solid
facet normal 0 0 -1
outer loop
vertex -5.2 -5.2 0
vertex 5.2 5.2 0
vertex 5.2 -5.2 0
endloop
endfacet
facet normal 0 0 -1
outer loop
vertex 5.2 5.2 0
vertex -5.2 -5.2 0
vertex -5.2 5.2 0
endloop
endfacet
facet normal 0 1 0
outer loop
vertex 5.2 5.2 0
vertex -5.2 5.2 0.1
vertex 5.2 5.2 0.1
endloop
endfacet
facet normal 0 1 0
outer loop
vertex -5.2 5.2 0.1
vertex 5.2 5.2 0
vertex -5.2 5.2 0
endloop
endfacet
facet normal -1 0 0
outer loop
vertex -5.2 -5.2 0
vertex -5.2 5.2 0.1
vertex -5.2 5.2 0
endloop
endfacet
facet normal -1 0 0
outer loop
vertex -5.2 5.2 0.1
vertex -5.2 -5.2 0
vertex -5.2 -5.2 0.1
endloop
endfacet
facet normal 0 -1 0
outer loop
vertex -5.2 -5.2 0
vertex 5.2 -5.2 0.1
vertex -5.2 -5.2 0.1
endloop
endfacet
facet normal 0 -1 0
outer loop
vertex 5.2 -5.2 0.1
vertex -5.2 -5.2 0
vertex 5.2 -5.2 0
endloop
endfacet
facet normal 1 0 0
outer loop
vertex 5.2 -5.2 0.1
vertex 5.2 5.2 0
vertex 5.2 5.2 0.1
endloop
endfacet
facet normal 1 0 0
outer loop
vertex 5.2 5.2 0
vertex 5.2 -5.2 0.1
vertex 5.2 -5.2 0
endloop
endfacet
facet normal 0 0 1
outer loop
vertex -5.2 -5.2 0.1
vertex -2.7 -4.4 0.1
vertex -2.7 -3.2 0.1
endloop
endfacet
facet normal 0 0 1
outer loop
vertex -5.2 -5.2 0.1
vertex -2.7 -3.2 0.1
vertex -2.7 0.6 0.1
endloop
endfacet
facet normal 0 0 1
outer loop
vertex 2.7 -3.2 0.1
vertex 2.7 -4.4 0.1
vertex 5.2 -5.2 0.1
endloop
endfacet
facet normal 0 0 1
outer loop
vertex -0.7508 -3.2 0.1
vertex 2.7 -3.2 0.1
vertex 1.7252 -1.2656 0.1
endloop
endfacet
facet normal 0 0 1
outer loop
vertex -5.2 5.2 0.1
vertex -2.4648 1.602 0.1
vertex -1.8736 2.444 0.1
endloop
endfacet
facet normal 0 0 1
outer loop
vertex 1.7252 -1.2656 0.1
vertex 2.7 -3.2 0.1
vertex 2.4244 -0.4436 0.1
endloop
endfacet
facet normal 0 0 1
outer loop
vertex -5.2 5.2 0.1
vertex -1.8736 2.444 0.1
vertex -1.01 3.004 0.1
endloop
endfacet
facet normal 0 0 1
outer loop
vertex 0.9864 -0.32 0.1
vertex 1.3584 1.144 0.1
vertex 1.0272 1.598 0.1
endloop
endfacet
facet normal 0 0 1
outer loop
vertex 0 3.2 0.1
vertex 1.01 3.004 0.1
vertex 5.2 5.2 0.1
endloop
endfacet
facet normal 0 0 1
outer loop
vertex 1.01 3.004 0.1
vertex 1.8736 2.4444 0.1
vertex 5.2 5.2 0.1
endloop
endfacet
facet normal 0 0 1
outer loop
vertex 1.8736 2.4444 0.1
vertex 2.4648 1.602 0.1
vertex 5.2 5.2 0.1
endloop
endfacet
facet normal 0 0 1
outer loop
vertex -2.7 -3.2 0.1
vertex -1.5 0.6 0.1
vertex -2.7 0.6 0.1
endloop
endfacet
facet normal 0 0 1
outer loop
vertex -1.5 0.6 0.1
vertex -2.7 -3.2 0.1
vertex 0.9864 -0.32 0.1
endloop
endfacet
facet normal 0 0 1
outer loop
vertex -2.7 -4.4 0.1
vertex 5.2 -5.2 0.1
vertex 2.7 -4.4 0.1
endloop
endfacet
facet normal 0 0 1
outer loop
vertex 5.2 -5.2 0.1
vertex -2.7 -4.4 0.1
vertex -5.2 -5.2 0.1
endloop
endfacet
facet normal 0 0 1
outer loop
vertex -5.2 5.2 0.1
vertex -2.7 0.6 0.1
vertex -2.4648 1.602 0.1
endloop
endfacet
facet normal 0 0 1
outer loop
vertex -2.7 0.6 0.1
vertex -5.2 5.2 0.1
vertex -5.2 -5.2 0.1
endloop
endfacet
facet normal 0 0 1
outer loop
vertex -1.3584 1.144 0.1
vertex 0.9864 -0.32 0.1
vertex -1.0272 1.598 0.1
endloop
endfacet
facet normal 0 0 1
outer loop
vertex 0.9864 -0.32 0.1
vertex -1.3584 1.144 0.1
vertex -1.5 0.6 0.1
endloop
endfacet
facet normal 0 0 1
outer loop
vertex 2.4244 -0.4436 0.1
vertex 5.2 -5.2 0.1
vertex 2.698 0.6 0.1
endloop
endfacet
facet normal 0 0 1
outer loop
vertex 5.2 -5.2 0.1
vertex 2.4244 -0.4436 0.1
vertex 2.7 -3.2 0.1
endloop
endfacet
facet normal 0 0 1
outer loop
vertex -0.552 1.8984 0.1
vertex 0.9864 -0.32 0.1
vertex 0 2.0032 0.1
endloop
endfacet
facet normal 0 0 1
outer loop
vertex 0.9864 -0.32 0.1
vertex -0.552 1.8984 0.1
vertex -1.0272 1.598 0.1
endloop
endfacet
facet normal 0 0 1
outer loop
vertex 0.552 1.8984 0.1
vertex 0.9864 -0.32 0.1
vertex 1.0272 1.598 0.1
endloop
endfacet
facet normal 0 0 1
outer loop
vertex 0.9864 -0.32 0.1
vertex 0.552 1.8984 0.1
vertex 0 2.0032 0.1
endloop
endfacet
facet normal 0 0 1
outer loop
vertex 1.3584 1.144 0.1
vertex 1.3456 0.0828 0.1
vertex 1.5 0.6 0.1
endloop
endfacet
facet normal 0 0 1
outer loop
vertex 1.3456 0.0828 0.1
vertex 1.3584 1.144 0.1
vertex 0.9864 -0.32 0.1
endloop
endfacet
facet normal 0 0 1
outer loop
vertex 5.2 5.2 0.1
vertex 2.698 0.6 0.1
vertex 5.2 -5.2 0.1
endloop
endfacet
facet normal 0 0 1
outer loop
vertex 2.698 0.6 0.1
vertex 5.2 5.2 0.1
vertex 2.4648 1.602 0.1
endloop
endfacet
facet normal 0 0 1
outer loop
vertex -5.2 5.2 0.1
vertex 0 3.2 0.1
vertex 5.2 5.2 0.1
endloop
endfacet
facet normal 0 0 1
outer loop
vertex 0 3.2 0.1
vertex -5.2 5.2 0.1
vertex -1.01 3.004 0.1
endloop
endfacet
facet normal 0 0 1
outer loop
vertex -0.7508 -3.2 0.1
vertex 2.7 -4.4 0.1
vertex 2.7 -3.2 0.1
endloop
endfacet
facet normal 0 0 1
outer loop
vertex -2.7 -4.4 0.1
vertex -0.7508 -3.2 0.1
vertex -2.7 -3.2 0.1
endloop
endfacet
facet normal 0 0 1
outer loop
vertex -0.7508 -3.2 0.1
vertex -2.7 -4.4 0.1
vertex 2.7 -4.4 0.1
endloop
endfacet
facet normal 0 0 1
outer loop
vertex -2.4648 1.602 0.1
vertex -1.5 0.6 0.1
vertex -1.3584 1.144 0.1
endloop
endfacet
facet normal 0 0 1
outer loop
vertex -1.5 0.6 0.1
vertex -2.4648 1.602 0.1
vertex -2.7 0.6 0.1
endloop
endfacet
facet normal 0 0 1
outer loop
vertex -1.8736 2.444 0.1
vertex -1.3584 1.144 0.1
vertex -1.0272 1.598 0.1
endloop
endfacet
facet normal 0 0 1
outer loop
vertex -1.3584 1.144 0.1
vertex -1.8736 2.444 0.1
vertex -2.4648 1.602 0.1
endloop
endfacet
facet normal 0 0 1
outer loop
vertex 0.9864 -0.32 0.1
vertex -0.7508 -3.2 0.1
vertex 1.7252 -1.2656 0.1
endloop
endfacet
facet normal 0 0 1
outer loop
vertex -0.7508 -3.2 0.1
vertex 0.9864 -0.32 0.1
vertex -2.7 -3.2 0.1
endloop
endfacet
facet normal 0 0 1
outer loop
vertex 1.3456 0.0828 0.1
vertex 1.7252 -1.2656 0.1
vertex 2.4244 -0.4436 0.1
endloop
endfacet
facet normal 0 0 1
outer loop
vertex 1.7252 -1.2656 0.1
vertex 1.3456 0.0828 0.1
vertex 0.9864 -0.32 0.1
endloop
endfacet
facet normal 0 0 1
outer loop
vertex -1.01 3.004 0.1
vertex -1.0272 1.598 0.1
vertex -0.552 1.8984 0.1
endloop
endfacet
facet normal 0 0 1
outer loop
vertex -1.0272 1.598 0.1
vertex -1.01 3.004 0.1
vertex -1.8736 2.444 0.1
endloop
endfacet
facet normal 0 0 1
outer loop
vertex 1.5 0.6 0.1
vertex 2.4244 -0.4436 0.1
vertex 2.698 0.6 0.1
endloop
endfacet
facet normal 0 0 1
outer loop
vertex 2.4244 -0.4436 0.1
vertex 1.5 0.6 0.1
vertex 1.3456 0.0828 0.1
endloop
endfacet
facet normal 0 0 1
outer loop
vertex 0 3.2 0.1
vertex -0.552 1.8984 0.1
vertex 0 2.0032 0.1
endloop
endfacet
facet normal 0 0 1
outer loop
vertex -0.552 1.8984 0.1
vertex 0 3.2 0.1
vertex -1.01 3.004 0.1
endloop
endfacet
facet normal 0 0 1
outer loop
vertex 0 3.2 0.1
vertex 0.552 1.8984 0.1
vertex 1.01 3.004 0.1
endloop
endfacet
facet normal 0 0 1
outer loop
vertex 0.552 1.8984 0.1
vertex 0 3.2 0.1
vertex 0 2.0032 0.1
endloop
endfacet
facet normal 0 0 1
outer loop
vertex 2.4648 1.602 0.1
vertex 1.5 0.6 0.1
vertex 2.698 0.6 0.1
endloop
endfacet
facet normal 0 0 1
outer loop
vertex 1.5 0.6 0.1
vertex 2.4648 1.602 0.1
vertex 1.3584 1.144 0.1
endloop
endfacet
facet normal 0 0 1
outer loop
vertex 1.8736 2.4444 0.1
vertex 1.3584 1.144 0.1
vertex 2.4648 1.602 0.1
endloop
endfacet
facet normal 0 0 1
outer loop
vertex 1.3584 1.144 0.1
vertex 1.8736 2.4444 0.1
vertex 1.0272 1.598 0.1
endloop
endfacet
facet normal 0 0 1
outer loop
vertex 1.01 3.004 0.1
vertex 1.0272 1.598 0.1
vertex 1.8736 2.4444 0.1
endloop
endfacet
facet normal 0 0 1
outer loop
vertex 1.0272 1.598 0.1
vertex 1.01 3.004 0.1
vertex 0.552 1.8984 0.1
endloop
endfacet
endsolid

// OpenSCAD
// file: ../p/box5-12.scad
use <../lib.scad>
function ldraw_lib__box5_12() = [
// 0 Box with 5 Faces without Any Edges
// 0 Name: box5-12.dat
// 0 Author: Chris Dee [cwdee]
// 0 !LDRAW_ORG Primitive UPDATE 2009-02
// 0 !LICENSE Licensed under CC BY 4.0 : see CAreadme.txt
// 
// 0 BFC CERTIFY CCW
  [0,"BFC","CERTIFY"],
  [0,"BFC","CCW"],
// 
// 0 !HISTORY 2009-09-03 [PTadmin] Official Update 2009-02
// 
// 
// 4 16 1 1 1 1 1 -1 -1 1 -1 -1 1 1
  [4,16,1,1,1,1,1,-1,-1,1,-1,-1,1,1],
// 4 16 -1 0 1 1 0 1 1 1 1 -1 1 1
  [4,16,-1,0,1,1,0,1,1,1,1,-1,1,1],
// 4 16 -1 0 -1 -1 0 1 -1 1 1 -1 1 -1
  [4,16,-1,0,-1,-1,0,1,-1,1,1,-1,1,-1],
// 4 16 1 0 -1 -1 0 -1 -1 1 -1 1 1 -1
  [4,16,1,0,-1,-1,0,-1,-1,1,-1,1,1,-1],
// 4 16 1 0 1 1 0 -1 1 1 -1 1 1 1
  [4,16,1,0,1,1,0,-1,1,1,-1,1,1,1],
// 0
];
module ldraw_lib__box5_12(step=0, col=false, unit=2/5, alt=false, line=0.2, solid=!$preview)
    makepoly(ldraw_lib__box5_12(), step=step, col=col, unit=unit, alt=alt, line=line, solid=solid);
ldraw_lib__box5_12(line=0.2);
// main file
use <../lib.scad>
use <../p/box5-12.scad>
function ldraw_lib__169665f() = [
// 0 Sticker  1.3 x  1.3 with Black Number "2"
// 0 Name: 169665f.dat
// 0 Author: Chris Böhnke [KnightOfTarenta]
// 0 !LDRAW_ORG Part UPDATE 2026-06
// 0 !LICENSE Licensed under CC BY 4.0 : see CAreadme.txt
// 
// 0 BFC CERTIFY CCW
  [0,"BFC","CERTIFY"],
  [0,"BFC","CCW"],
// 
// 0 !KEYWORDS Booster Rocket, Bricklink 6339stk01, Brickowl 588738, Launch Command
// 0 !KEYWORDS Rebrickable 169665, set 6339, Shuttle Launch Pad, space port, town
// 
// 0 !HISTORY 2026-06-28 [OrionP] Official Update 2026-06
// 
// 1 16 0 -0.25 0 13 0 0 0 .25 0 0 0 13 box5-12.dat
  [1,16,0,-0.25,0,13,0,0,0,.25,0,0,0,13, ldraw_lib__box5_12()],
// 
// 0 // Colour 16 Main Colour
// 3 16 -13 -.25 -13 -6.75 -.25 -11 -6.75 -.25 -8
  [3,16,-13,-.25,-13,-6.75,-.25,-11,-6.75,-.25,-8],
// 3 16 -13 -.25 -13 -6.75 -.25 -8 -6.75 -.25 1.5
  [3,16,-13,-.25,-13,-6.75,-.25,-8,-6.75,-.25,1.5],
// 3 16 6.75 -.25 -8 6.75 -.25 -11 13 -.25 -13
  [3,16,6.75,-.25,-8,6.75,-.25,-11,13,-.25,-13],
// 3 16 -1.877 -.25 -8 6.75 -.25 -8 4.313 -.25 -3.164
  [3,16,-1.877,-.25,-8,6.75,-.25,-8,4.313,-.25,-3.164],
// 3 16 -13 -.25 13 -6.162 -.25 4.005 -4.684 -.25 6.11
  [3,16,-13,-.25,13,-6.162,-.25,4.005,-4.684,-.25,6.11],
// 3 16 4.313 -.25 -3.164 6.75 -.25 -8 6.061 -.25 -1.109
  [3,16,4.313,-.25,-3.164,6.75,-.25,-8,6.061,-.25,-1.109],
// 3 16 -13 -.25 13 -4.684 -.25 6.11 -2.525 -.25 7.51
  [3,16,-13,-.25,13,-4.684,-.25,6.11,-2.525,-.25,7.51],
// 3 16 2.466 -.25 -.8 3.396 -.25 2.86 2.568 -.25 3.995
  [3,16,2.466,-.25,-.8,3.396,-.25,2.86,2.568,-.25,3.995],
// 3 16 0 -.25 8 2.525 -.25 7.51 13 -.25 13
  [3,16,0,-.25,8,2.525,-.25,7.51,13,-.25,13],
// 3 16 2.525 -.25 7.51 4.684 -.25 6.111 13 -.25 13
  [3,16,2.525,-.25,7.51,4.684,-.25,6.111,13,-.25,13],
// 3 16 4.684 -.25 6.111 6.162 -.25 4.005 13 -.25 13
  [3,16,4.684,-.25,6.111,6.162,-.25,4.005,13,-.25,13],
// 4 16 2.466 -.25 -.8 -3.75 -.25 1.5 -6.75 -.25 1.5 -6.75 -.25 -8
  [4,16,2.466,-.25,-.8,-3.75,-.25,1.5,-6.75,-.25,1.5,-6.75,-.25,-8],
// 4 16 -13 -.25 -13 13 -.25 -13 6.75 -.25 -11 -6.75 -.25 -11
  [4,16,-13,-.25,-13,13,-.25,-13,6.75,-.25,-11,-6.75,-.25,-11],
// 4 16 -6.162 -.25 4.005 -13 -.25 13 -13 -.25 -13 -6.75 -.25 1.5
  [4,16,-6.162,-.25,4.005,-13,-.25,13,-13,-.25,-13,-6.75,-.25,1.5],
// 4 16 -2.568 -.25 3.995 -3.396 -.25 2.86 -3.75 -.25 1.5 2.466 -.25 -.8
  [4,16,-2.568,-.25,3.995,-3.396,-.25,2.86,-3.75,-.25,1.5,2.466,-.25,-.8],
// 4 16 6.745 -.25 1.5 6.061 -.25 -1.109 6.75 -.25 -8 13 -.25 -13
  [4,16,6.745,-.25,1.5,6.061,-.25,-1.109,6.75,-.25,-8,13,-.25,-13],
// 4 16 -2.568 -.25 3.995 2.466 -.25 -.8 0 -.25 5.008 -1.38 -.25 4.746
  [4,16,-2.568,-.25,3.995,2.466,-.25,-.8,0,-.25,5.008,-1.38,-.25,4.746],
// 4 16 2.568 -.25 3.995 1.38 -.25 4.746 0 -.25 5.008 2.466 -.25 -.8
  [4,16,2.568,-.25,3.995,1.38,-.25,4.746,0,-.25,5.008,2.466,-.25,-.8],
// 4 16 3.75 -.25 1.5 3.396 -.25 2.86 2.466 -.25 -.8 3.364 -.25 .207
  [4,16,3.75,-.25,1.5,3.396,-.25,2.86,2.466,-.25,-.8,3.364,-.25,.207],
// 4 16 6.162 -.25 4.005 6.745 -.25 1.5 13 -.25 -13 13 -.25 13
  [4,16,6.162,-.25,4.005,6.745,-.25,1.5,13,-.25,-13,13,-.25,13],
// 4 16 -2.525 -.25 7.51 0 -.25 8 13 -.25 13 -13 -.25 13
  [4,16,-2.525,-.25,7.51,0,-.25,8,13,-.25,13,-13,-.25,13],
// 
// 0 BFC NOCLIP
  [0,"BFC","NOCLIP"],
// 0 // Colour 0 Black
// 3 0 -1.877 -.25 -8 6.75 -.25 -11 6.75 -.25 -8
  [3,0,-1.877,-.25,-8,6.75,-.25,-11,6.75,-.25,-8],
// 4 0 -6.75 -.25 -8 -6.75 -.25 -11 6.75 -.25 -11 -1.877 -.25 -8
  [4,0,-6.75,-.25,-8,-6.75,-.25,-11,6.75,-.25,-11,-1.877,-.25,-8],
// 4 0 -3.396 -.25 2.86 -6.162 -.25 4.005 -6.75 -.25 1.5 -3.75 -.25 1.5
  [4,0,-3.396,-.25,2.86,-6.162,-.25,4.005,-6.75,-.25,1.5,-3.75,-.25,1.5],
// 4 0 -6.162 -.25 4.005 -3.396 -.25 2.86 -2.568 -.25 3.995 -4.684 -.25 6.11
  [4,0,-6.162,-.25,4.005,-3.396,-.25,2.86,-2.568,-.25,3.995,-4.684,-.25,6.11],
// 4 0 -6.75 -.25 -8 -1.877 -.25 -8 4.313 -.25 -3.164 2.466 -.25 -.8
  [4,0,-6.75,-.25,-8,-1.877,-.25,-8,4.313,-.25,-3.164,2.466,-.25,-.8],
// 4 0 2.466 -.25 -.8 4.313 -.25 -3.164 6.061 -.25 -1.109 3.364 -.25 .207
  [4,0,2.466,-.25,-.8,4.313,-.25,-3.164,6.061,-.25,-1.109,3.364,-.25,.207],
// 4 0 -1.38 -.25 4.746 -2.525 -.25 7.51 -4.684 -.25 6.11 -2.568 -.25 3.995
  [4,0,-1.38,-.25,4.746,-2.525,-.25,7.51,-4.684,-.25,6.11,-2.568,-.25,3.995],
// 4 0 6.745 -.25 1.5 3.75 -.25 1.5 3.364 -.25 .207 6.061 -.25 -1.109
  [4,0,6.745,-.25,1.5,3.75,-.25,1.5,3.364,-.25,.207,6.061,-.25,-1.109],
// 4 0 0 -.25 5.008 0 -.25 8 -2.525 -.25 7.51 -1.38 -.25 4.746
  [4,0,0,-.25,5.008,0,-.25,8,-2.525,-.25,7.51,-1.38,-.25,4.746],
// 4 0 0 -.25 5.008 1.38 -.25 4.746 2.525 -.25 7.51 0 -.25 8
  [4,0,0,-.25,5.008,1.38,-.25,4.746,2.525,-.25,7.51,0,-.25,8],
// 4 0 6.745 -.25 1.5 6.162 -.25 4.005 3.396 -.25 2.86 3.75 -.25 1.5
  [4,0,6.745,-.25,1.5,6.162,-.25,4.005,3.396,-.25,2.86,3.75,-.25,1.5],
// 4 0 6.162 -.25 4.005 4.684 -.25 6.111 2.568 -.25 3.995 3.396 -.25 2.86
  [4,0,6.162,-.25,4.005,4.684,-.25,6.111,2.568,-.25,3.995,3.396,-.25,2.86],
// 4 0 1.38 -.25 4.746 2.568 -.25 3.995 4.684 -.25 6.111 2.525 -.25 7.51
  [4,0,1.38,-.25,4.746,2.568,-.25,3.995,4.684,-.25,6.111,2.525,-.25,7.51],
];
module ldraw_lib__169665f(step=0, col=false, unit=2/5, alt=false, line=0.2, solid=!$preview)
    makepoly(ldraw_lib__169665f(), step=step, col=col, unit=unit, alt=alt, line=line, solid=solid);
ldraw_lib__169665f(line=0.2);
